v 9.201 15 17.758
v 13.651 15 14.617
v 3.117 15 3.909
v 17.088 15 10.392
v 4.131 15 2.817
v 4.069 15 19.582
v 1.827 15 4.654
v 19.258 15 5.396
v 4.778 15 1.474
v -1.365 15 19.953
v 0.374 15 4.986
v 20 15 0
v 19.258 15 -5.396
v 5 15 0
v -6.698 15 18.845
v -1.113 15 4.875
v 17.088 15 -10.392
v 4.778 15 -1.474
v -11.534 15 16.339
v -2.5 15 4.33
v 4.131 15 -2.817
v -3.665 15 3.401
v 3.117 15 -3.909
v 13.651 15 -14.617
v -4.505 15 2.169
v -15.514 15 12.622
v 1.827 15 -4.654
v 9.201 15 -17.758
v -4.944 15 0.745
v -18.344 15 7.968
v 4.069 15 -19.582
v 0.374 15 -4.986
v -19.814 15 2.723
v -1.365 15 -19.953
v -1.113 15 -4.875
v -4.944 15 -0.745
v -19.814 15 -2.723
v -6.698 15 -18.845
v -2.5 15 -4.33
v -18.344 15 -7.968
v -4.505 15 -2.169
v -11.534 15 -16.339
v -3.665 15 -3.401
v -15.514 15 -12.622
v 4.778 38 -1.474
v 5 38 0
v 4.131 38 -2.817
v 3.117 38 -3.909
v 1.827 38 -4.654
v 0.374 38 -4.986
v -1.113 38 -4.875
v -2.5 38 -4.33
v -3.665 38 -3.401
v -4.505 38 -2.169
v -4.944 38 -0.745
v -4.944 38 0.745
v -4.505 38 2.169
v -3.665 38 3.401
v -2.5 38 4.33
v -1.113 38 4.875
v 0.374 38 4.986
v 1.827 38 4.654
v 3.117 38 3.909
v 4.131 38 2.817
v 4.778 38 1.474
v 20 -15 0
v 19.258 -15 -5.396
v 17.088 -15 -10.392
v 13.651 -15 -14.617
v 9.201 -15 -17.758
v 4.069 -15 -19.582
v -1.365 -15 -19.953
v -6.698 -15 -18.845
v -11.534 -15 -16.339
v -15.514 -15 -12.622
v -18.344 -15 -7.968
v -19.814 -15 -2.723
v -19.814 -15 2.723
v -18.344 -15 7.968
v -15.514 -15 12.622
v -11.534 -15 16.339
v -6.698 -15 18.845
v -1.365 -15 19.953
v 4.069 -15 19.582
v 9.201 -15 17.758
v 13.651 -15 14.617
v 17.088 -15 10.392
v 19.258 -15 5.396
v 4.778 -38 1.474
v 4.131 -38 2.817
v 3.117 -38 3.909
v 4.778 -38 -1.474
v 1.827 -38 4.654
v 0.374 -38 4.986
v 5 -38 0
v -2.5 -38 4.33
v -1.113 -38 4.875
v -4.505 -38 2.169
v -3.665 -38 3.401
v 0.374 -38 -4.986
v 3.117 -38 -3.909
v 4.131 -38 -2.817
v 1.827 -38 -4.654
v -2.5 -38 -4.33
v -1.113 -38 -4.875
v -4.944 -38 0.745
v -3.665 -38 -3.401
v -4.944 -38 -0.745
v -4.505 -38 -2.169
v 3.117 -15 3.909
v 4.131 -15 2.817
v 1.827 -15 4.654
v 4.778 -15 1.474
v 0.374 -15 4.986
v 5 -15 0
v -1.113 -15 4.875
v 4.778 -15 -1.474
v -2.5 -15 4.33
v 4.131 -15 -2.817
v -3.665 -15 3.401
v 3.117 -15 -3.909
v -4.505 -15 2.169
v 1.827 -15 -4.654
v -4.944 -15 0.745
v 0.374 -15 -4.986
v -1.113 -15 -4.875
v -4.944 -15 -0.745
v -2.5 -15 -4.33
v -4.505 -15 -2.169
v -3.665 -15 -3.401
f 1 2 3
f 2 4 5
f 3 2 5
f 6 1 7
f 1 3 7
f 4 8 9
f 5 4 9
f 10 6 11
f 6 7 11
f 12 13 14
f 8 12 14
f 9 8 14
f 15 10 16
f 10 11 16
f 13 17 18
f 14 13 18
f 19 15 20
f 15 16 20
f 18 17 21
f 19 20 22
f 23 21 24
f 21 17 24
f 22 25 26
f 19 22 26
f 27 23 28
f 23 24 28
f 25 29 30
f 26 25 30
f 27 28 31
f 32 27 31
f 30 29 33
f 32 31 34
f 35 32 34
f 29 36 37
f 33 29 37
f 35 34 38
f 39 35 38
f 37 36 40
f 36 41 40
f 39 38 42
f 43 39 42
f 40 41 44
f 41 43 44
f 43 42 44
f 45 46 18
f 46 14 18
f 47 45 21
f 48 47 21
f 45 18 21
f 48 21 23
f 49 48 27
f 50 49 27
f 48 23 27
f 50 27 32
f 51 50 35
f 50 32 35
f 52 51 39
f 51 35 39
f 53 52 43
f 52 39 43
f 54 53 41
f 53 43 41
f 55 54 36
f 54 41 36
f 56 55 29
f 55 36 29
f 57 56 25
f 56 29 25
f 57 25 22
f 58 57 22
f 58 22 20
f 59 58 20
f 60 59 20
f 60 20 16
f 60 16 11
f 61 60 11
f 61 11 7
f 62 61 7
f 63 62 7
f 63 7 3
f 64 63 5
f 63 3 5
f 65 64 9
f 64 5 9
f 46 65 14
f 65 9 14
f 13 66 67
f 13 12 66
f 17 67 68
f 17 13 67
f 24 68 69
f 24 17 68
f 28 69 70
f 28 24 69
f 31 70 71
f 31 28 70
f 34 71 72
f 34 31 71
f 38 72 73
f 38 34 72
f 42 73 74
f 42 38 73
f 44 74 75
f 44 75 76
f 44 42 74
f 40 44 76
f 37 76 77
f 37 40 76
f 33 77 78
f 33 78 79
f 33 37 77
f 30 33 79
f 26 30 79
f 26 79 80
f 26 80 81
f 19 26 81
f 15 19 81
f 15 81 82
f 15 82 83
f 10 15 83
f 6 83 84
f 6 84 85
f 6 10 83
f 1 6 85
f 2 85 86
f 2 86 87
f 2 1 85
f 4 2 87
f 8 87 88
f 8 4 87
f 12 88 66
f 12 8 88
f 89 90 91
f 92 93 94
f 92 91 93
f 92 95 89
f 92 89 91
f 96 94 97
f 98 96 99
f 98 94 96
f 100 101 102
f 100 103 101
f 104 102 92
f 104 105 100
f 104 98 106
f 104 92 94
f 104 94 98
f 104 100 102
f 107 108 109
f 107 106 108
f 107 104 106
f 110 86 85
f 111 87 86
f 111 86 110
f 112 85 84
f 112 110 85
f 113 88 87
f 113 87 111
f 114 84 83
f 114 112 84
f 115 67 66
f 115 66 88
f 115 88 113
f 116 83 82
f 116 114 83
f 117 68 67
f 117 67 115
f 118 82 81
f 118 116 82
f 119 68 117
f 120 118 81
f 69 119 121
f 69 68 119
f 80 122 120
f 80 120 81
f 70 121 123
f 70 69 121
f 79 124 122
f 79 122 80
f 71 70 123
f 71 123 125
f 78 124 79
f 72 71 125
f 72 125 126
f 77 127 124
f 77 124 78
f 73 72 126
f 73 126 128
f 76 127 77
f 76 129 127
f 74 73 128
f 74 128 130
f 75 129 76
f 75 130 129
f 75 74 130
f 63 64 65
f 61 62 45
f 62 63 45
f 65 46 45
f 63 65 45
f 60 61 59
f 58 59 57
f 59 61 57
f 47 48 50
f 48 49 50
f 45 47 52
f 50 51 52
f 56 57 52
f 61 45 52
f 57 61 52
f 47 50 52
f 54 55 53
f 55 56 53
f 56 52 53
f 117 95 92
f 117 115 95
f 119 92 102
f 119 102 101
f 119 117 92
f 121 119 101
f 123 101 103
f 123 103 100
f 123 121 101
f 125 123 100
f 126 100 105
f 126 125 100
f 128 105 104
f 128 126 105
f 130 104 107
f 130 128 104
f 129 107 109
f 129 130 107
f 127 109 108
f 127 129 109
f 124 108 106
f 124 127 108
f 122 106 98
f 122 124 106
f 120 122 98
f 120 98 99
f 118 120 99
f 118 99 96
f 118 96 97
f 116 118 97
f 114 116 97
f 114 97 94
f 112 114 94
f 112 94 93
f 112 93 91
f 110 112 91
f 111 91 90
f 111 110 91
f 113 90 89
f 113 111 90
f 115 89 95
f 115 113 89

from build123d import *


with BuildPart() as part:
    # Sketch1 → Revolve1 (revolve)
    with BuildSketch(Plane.XY):
        Polygon((0, 38), (5, 38), (5, 15), (20, 15), (20, 0), (0, 0), align=None)
    revolve1 = revolve(axis=Axis((0, 0, 0), (0, 1, 0)))

    # Mirror1: Revolve1 across plane
    add(revolve1.mirror(Plane(origin=(20, 0, 0), x_dir=(0, 0, 1), z_dir=(0, -1, 0))))


solid = part.part
